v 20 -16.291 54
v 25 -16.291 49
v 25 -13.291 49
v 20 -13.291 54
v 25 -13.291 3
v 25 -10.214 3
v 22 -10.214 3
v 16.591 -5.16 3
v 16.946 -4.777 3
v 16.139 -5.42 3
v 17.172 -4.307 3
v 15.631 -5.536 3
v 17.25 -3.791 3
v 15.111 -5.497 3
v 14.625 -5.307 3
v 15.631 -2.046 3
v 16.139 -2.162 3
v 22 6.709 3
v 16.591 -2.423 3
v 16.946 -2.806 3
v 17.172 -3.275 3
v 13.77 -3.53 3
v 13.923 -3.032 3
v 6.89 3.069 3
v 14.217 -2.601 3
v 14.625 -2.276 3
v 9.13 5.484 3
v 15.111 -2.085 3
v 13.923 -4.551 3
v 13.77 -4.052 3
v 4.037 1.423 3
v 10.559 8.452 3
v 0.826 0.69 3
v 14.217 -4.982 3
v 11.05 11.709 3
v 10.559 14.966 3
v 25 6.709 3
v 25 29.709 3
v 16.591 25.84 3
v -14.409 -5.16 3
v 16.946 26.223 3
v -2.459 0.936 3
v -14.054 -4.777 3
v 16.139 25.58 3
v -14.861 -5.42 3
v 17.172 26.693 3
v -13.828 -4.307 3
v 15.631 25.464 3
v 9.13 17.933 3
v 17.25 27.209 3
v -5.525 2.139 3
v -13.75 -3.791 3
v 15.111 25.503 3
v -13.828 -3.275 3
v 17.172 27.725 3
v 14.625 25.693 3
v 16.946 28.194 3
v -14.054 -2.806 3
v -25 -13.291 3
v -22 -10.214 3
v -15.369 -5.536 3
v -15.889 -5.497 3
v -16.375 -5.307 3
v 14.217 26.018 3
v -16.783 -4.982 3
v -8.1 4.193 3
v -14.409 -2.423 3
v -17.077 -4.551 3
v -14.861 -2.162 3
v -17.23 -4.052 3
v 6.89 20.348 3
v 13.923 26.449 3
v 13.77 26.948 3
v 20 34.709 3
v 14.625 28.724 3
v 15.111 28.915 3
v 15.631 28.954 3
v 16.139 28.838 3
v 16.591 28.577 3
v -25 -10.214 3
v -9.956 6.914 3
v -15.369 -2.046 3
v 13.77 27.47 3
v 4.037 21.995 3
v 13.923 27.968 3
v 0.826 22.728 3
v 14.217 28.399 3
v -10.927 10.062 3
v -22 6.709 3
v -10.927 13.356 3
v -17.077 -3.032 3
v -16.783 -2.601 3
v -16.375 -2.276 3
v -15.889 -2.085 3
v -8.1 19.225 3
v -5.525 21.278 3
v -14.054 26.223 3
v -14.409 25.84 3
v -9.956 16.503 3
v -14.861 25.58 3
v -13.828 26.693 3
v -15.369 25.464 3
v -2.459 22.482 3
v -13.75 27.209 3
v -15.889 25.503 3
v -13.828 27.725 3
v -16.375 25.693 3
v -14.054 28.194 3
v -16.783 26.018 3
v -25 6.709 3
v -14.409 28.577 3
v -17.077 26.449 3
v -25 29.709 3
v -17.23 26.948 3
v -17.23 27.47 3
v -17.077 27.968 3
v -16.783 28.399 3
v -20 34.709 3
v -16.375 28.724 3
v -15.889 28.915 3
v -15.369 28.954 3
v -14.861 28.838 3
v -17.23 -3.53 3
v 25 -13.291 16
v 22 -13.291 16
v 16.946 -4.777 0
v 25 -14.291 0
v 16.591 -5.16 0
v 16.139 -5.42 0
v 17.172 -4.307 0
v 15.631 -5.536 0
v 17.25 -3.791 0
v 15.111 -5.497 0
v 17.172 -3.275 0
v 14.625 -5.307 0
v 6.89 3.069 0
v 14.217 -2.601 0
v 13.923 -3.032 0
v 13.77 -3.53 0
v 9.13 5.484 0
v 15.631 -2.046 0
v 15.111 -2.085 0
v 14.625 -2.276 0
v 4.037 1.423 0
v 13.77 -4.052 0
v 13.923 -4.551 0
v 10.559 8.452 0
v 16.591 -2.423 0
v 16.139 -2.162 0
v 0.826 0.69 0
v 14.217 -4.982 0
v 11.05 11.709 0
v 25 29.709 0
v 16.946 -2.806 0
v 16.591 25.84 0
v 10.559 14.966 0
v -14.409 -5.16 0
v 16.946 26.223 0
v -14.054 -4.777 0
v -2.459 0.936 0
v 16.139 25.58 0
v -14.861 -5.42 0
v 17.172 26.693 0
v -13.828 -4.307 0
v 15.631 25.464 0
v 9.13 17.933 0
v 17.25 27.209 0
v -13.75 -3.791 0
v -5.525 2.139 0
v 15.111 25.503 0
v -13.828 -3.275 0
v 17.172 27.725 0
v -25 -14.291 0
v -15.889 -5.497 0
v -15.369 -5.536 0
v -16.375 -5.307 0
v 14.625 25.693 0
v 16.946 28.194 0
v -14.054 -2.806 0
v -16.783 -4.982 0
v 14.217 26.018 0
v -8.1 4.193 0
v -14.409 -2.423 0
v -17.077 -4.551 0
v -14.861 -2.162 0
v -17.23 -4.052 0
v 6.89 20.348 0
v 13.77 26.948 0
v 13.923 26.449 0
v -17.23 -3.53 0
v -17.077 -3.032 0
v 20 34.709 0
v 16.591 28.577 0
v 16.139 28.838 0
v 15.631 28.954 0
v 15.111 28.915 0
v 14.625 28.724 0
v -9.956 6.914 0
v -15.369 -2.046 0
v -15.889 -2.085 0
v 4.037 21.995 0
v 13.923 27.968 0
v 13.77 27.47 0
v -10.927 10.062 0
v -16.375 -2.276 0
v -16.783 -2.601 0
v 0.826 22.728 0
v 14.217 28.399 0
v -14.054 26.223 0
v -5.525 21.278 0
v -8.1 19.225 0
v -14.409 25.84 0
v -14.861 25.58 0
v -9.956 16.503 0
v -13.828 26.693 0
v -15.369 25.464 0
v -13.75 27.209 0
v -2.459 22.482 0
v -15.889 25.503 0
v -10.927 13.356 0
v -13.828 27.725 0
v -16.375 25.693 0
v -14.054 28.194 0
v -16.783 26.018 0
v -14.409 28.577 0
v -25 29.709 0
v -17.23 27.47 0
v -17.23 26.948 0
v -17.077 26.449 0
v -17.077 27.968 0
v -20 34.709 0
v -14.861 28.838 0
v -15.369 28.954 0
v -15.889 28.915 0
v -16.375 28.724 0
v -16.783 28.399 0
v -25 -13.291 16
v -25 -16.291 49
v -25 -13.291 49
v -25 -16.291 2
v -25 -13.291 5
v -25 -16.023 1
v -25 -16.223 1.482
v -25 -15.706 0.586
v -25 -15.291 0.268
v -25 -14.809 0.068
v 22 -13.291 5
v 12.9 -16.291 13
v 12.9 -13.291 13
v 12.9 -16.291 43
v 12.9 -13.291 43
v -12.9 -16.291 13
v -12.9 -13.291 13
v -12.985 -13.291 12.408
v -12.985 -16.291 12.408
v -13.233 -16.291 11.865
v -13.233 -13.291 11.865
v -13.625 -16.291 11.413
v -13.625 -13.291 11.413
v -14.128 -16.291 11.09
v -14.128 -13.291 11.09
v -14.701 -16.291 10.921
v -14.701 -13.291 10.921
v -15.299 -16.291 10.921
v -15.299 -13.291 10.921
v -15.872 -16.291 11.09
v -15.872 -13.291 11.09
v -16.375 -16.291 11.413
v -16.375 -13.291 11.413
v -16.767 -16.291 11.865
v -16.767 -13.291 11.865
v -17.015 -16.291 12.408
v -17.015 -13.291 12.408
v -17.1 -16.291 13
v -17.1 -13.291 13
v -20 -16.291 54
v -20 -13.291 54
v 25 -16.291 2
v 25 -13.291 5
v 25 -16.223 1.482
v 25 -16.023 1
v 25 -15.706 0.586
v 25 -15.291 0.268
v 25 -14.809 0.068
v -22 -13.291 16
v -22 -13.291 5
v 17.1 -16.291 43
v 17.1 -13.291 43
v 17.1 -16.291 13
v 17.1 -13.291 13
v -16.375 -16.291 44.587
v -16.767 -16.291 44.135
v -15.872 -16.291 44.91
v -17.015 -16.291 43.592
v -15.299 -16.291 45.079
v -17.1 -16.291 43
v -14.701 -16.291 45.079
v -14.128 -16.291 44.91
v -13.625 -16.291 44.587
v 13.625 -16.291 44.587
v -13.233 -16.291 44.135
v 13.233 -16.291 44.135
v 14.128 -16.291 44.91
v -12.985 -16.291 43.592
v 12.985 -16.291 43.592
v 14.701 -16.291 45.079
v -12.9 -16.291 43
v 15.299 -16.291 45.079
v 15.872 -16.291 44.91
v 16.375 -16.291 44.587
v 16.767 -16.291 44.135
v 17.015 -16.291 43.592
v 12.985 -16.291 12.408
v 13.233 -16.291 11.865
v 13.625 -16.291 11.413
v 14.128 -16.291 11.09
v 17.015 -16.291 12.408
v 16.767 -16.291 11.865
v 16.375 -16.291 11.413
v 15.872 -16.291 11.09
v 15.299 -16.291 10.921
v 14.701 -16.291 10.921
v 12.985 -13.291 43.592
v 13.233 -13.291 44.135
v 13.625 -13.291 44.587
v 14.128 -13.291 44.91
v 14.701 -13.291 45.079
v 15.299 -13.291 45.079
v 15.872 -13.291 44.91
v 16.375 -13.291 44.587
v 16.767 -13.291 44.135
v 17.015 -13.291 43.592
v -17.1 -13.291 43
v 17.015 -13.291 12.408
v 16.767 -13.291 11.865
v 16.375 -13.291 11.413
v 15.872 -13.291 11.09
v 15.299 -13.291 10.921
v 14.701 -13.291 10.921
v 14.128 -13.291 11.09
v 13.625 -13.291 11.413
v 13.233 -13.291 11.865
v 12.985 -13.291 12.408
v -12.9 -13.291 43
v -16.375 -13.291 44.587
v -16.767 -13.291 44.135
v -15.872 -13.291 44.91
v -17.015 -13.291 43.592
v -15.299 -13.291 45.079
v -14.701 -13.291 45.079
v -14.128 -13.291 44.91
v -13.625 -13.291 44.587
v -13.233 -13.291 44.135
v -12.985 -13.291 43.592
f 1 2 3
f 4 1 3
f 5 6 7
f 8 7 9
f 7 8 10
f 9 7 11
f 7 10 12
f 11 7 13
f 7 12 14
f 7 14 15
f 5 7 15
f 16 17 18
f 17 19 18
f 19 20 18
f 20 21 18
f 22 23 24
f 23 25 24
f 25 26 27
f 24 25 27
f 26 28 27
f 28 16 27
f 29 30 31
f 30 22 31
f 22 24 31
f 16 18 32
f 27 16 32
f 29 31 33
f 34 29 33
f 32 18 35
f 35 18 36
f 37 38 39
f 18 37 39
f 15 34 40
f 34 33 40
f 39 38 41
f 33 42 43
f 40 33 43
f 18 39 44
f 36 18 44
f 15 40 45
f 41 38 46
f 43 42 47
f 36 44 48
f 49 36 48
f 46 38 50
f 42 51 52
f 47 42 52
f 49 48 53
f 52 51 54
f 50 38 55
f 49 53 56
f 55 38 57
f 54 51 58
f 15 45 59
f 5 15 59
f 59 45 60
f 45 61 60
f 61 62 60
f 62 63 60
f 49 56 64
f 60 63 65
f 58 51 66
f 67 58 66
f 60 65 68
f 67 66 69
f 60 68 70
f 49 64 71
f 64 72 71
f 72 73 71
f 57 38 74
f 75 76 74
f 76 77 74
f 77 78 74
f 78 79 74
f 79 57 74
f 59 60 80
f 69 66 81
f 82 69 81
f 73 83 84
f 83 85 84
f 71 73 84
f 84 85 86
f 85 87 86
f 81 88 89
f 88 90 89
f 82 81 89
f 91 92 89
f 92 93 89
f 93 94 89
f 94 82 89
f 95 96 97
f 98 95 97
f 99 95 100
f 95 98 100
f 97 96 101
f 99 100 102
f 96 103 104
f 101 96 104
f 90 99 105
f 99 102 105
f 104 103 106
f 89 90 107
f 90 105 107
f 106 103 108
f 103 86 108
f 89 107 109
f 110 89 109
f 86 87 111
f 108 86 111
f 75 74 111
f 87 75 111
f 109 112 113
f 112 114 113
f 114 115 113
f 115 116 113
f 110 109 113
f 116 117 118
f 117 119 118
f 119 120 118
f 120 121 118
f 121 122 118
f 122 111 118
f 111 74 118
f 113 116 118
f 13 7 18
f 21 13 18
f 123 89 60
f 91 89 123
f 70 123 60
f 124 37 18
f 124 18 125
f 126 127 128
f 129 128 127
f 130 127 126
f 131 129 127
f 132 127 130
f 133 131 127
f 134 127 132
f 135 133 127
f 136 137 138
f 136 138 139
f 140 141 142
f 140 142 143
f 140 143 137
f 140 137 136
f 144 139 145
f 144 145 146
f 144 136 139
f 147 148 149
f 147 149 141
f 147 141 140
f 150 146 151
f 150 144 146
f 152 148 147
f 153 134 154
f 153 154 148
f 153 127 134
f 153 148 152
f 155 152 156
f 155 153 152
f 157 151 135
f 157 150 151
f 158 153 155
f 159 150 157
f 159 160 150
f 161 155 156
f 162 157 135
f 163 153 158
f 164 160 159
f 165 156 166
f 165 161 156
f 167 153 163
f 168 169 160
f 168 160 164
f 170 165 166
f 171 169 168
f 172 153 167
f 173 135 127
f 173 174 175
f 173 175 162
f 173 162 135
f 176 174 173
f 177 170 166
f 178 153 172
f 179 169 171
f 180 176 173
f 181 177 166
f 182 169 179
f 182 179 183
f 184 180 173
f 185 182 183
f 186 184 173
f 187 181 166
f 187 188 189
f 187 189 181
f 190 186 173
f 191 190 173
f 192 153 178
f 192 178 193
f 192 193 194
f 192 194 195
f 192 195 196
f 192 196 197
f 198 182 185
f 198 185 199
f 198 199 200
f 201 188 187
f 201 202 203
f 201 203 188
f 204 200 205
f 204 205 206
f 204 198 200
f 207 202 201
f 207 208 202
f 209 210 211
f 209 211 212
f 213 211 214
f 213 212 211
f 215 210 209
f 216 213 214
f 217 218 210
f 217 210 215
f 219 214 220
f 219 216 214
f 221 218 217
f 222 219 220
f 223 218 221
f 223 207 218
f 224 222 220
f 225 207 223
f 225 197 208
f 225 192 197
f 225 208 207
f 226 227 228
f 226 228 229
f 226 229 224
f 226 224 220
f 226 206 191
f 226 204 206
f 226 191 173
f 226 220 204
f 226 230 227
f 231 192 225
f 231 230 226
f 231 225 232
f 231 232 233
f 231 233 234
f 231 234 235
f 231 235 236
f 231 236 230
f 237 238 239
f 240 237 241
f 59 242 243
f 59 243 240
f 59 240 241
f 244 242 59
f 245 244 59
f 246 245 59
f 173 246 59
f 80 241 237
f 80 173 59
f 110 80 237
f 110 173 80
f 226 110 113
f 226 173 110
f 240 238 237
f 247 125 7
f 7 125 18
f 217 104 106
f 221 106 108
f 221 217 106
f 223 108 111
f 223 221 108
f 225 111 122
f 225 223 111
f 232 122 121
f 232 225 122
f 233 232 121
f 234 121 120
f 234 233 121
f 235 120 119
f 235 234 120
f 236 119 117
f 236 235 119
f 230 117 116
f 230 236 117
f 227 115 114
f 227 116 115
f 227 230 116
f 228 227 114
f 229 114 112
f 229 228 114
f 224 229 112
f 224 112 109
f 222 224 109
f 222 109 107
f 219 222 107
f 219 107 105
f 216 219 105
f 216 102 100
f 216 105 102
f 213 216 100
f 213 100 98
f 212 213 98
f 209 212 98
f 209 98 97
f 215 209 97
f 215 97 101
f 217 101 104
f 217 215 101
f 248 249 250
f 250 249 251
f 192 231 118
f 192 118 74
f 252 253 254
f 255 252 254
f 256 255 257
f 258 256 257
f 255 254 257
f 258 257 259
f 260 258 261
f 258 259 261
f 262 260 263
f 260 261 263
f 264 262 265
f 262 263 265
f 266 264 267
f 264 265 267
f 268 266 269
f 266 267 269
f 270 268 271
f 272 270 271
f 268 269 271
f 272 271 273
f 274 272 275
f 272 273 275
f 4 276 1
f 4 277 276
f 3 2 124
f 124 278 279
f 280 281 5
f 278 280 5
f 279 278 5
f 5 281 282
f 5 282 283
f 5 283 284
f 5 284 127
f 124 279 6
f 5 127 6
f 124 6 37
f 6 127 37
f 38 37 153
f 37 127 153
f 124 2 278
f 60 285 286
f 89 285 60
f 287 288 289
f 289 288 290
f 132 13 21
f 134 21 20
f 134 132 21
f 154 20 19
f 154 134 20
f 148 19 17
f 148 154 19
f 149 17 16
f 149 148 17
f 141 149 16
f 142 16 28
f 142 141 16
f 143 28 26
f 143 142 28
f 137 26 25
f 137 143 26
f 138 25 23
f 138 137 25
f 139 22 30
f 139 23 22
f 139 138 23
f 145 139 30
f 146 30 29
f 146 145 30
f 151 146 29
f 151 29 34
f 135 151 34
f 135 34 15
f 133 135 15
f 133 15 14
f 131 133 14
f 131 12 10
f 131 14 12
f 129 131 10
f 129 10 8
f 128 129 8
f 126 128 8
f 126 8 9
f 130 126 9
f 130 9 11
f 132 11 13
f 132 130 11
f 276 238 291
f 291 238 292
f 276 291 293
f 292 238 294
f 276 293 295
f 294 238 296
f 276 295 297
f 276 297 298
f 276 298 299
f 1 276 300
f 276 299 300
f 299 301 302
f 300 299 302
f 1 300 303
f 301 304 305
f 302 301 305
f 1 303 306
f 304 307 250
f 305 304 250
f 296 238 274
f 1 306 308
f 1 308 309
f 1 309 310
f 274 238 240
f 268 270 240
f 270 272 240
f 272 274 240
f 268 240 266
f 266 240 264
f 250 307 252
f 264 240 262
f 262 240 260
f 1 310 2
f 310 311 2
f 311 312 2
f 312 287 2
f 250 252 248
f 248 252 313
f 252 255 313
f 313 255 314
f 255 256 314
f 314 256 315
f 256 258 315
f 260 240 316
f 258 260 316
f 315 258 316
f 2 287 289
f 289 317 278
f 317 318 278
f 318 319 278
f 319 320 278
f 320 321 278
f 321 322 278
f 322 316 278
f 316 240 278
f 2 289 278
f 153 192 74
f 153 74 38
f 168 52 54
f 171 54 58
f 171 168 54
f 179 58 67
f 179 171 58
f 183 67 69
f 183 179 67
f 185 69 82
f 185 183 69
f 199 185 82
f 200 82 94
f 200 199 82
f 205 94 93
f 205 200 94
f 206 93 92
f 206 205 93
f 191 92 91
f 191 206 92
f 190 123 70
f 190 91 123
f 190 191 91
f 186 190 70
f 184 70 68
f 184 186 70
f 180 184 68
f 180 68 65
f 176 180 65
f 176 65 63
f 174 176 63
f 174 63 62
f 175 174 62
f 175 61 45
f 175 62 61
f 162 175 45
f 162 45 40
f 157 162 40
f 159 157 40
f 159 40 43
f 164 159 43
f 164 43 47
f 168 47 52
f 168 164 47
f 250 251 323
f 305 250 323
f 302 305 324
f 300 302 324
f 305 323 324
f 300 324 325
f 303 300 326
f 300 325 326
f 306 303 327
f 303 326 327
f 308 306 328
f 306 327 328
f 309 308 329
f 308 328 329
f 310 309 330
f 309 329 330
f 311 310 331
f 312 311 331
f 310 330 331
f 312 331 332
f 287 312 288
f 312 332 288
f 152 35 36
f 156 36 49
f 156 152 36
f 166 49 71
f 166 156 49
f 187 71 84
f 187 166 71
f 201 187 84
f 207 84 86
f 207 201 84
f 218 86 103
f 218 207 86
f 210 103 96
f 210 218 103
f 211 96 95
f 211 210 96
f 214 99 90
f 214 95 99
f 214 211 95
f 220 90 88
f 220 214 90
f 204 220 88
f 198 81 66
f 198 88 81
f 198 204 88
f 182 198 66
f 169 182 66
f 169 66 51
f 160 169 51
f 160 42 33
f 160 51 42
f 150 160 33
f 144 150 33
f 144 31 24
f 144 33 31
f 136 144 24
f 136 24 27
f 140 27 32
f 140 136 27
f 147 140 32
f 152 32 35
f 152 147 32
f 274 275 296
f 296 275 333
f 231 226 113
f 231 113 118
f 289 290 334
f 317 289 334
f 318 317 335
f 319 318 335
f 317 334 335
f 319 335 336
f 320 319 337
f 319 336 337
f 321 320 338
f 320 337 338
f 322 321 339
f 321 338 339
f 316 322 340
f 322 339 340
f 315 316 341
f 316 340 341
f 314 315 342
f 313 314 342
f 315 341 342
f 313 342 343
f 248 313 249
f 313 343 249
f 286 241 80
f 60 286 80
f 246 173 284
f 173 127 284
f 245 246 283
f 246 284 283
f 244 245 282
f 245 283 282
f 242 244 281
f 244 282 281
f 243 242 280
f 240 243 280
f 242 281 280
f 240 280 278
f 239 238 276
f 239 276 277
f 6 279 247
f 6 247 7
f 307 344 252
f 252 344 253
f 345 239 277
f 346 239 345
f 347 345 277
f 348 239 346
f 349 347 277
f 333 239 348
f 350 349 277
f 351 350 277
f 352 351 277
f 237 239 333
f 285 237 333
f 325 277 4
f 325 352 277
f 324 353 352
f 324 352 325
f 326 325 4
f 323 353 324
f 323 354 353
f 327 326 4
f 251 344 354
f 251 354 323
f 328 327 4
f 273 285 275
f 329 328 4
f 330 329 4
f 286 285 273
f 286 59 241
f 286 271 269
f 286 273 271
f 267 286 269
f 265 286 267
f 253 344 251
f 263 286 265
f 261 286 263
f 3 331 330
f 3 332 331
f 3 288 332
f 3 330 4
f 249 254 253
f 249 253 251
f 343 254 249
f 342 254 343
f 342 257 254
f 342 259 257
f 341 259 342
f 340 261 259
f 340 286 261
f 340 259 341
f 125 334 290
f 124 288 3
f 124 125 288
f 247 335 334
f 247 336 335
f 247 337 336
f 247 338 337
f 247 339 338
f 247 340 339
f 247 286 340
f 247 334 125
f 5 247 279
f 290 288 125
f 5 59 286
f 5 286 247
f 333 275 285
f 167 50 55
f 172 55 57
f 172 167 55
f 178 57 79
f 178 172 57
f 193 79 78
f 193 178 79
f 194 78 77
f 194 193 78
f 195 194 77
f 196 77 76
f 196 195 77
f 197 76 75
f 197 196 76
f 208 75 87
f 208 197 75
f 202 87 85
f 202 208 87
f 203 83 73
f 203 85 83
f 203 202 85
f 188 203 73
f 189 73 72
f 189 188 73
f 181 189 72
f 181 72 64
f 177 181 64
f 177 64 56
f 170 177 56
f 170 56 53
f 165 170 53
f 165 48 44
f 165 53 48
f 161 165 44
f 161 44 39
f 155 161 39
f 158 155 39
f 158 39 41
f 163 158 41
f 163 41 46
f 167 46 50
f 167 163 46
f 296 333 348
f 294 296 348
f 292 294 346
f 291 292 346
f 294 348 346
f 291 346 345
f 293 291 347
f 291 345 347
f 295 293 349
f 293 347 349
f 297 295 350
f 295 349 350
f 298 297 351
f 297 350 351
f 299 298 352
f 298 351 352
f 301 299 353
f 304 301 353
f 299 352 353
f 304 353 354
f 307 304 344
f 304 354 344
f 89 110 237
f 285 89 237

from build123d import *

# Parameters (mm, degrees)
SKETCH_1_R          = 1.75
SKETCH_1_R_2        = 11.05
EXTRUDE_1_DEPTH     = 3
SKETCH_2_W          = 50
SKETCH_2_H          = 3
EXTRUDE_2_DEPTH     = 51
FILLET_1_R          = 2
CUT_EXTRUDE_1_DEPTH = 51
CHAMFER_1_SIZE      = 5
EXTRUDE_3_DEPTH     = 3
FILLET_3_R          = 2


with BuildPart() as part:
    # 草图1 → 凸台-拉伸1 (new body)
    with BuildSketch(Plane.XY):
        Polygon((25, 29.708680022), (25, -16.291319978), (-25, -16.291319978), (-25, 29.708680022), (-20, 34.708680022), (20, 34.708680022), align=None)
        with Locations((-15.5, 27.208680022)):
            Circle(SKETCH_1_R, mode=Mode.SUBTRACT)
        with Locations((15.5, 27.208680022)):
            Circle(SKETCH_1_R, mode=Mode.SUBTRACT)
        with Locations((-15.5, -3.791319978)):
            Circle(SKETCH_1_R, mode=Mode.SUBTRACT)
        with Locations((15.5, -3.791319978)):
            Circle(SKETCH_1_R, mode=Mode.SUBTRACT)
        with Locations((0, 11.708680022)):
            Circle(SKETCH_1_R_2, mode=Mode.SUBTRACT)
    extrude_1 = extrude(amount=EXTRUDE_1_DEPTH)

    # 草图2 → 凸台-拉伸2 (add)
    with BuildSketch(Plane.XY.offset(3)):
        with Locations((0, -14.791319978)):
            Rectangle(SKETCH_2_W, SKETCH_2_H)
    extrude(amount=EXTRUDE_2_DEPTH)

    # 圆角1
    fillet_1_edges = [part.edges().sort_by_distance(p)[0] for p in [
        (0, -16.291319978, 0),
    ]]
    fillet(fillet_1_edges, radius=FILLET_1_R)

    # 草图3 → 切除-拉伸1 (cut)
    with BuildSketch(Plane(origin=(0, -13.291319978, 0), x_dir=(1, 0, 0), z_dir=(0, 1, 0))):
        with BuildLine():
            Line((-17.1, -13), (-17.1, -43))
            ThreePointArc((-17.1, -43), (-15, -45.1), (-12.9, -43))
            Line((-12.9, -43), (-12.9, -13))
            ThreePointArc((-12.9, -13), (-15, -10.9), (-17.1, -13))
        make_face()
        with BuildLine():
            Line((12.9, -13), (12.9, -43))
            ThreePointArc((12.9, -43), (15, -45.1), (17.1, -43))
            Line((17.1, -43), (17.1, -13))
            ThreePointArc((17.1, -13), (15, -10.9), (12.9, -13))
        make_face()
    extrude(amount=-CUT_EXTRUDE_1_DEPTH, mode=Mode.SUBTRACT)

    # 倒角1
    chamfer_1_edges = [part.edges().sort_by_distance(p)[0] for p in [
        (-25, -14.791319978, 54),
        (25, -14.791319978, 54),
    ]]
    chamfer(chamfer_1_edges, length=CHAMFER_1_SIZE)

    # 草图4 → 凸台-拉伸3 (add)
    with BuildSketch(Plane(origin=(25, 0, 0), x_dir=(0, 0, -1), z_dir=(1, 0, 0))):
        Polygon((-3, 6.708680022), (-16, -13.291319978), (-5, -13.291319978), (-3, -10.214396901), align=None)
    extrude_3 = extrude(amount=-EXTRUDE_3_DEPTH)

    # 镜向1: 凸台-拉伸1, 凸台-拉伸3 across plane
    add(extrude_1.mirror(Plane(origin=(0, 0, 0), x_dir=(0, 0, 1), z_dir=(1, 0, 0))))
    add(extrude_3.mirror(Plane(origin=(0, 0, 0), x_dir=(0, 0, 1), z_dir=(1, 0, 0))))

    # 圆角3
    fillet_3_edges = [part.edges().sort_by_distance(p)[0] for p in [
        (0, -16.291319978, 0),
    ]]
    fillet(fillet_3_edges, radius=FILLET_3_R)


solid = part.part
